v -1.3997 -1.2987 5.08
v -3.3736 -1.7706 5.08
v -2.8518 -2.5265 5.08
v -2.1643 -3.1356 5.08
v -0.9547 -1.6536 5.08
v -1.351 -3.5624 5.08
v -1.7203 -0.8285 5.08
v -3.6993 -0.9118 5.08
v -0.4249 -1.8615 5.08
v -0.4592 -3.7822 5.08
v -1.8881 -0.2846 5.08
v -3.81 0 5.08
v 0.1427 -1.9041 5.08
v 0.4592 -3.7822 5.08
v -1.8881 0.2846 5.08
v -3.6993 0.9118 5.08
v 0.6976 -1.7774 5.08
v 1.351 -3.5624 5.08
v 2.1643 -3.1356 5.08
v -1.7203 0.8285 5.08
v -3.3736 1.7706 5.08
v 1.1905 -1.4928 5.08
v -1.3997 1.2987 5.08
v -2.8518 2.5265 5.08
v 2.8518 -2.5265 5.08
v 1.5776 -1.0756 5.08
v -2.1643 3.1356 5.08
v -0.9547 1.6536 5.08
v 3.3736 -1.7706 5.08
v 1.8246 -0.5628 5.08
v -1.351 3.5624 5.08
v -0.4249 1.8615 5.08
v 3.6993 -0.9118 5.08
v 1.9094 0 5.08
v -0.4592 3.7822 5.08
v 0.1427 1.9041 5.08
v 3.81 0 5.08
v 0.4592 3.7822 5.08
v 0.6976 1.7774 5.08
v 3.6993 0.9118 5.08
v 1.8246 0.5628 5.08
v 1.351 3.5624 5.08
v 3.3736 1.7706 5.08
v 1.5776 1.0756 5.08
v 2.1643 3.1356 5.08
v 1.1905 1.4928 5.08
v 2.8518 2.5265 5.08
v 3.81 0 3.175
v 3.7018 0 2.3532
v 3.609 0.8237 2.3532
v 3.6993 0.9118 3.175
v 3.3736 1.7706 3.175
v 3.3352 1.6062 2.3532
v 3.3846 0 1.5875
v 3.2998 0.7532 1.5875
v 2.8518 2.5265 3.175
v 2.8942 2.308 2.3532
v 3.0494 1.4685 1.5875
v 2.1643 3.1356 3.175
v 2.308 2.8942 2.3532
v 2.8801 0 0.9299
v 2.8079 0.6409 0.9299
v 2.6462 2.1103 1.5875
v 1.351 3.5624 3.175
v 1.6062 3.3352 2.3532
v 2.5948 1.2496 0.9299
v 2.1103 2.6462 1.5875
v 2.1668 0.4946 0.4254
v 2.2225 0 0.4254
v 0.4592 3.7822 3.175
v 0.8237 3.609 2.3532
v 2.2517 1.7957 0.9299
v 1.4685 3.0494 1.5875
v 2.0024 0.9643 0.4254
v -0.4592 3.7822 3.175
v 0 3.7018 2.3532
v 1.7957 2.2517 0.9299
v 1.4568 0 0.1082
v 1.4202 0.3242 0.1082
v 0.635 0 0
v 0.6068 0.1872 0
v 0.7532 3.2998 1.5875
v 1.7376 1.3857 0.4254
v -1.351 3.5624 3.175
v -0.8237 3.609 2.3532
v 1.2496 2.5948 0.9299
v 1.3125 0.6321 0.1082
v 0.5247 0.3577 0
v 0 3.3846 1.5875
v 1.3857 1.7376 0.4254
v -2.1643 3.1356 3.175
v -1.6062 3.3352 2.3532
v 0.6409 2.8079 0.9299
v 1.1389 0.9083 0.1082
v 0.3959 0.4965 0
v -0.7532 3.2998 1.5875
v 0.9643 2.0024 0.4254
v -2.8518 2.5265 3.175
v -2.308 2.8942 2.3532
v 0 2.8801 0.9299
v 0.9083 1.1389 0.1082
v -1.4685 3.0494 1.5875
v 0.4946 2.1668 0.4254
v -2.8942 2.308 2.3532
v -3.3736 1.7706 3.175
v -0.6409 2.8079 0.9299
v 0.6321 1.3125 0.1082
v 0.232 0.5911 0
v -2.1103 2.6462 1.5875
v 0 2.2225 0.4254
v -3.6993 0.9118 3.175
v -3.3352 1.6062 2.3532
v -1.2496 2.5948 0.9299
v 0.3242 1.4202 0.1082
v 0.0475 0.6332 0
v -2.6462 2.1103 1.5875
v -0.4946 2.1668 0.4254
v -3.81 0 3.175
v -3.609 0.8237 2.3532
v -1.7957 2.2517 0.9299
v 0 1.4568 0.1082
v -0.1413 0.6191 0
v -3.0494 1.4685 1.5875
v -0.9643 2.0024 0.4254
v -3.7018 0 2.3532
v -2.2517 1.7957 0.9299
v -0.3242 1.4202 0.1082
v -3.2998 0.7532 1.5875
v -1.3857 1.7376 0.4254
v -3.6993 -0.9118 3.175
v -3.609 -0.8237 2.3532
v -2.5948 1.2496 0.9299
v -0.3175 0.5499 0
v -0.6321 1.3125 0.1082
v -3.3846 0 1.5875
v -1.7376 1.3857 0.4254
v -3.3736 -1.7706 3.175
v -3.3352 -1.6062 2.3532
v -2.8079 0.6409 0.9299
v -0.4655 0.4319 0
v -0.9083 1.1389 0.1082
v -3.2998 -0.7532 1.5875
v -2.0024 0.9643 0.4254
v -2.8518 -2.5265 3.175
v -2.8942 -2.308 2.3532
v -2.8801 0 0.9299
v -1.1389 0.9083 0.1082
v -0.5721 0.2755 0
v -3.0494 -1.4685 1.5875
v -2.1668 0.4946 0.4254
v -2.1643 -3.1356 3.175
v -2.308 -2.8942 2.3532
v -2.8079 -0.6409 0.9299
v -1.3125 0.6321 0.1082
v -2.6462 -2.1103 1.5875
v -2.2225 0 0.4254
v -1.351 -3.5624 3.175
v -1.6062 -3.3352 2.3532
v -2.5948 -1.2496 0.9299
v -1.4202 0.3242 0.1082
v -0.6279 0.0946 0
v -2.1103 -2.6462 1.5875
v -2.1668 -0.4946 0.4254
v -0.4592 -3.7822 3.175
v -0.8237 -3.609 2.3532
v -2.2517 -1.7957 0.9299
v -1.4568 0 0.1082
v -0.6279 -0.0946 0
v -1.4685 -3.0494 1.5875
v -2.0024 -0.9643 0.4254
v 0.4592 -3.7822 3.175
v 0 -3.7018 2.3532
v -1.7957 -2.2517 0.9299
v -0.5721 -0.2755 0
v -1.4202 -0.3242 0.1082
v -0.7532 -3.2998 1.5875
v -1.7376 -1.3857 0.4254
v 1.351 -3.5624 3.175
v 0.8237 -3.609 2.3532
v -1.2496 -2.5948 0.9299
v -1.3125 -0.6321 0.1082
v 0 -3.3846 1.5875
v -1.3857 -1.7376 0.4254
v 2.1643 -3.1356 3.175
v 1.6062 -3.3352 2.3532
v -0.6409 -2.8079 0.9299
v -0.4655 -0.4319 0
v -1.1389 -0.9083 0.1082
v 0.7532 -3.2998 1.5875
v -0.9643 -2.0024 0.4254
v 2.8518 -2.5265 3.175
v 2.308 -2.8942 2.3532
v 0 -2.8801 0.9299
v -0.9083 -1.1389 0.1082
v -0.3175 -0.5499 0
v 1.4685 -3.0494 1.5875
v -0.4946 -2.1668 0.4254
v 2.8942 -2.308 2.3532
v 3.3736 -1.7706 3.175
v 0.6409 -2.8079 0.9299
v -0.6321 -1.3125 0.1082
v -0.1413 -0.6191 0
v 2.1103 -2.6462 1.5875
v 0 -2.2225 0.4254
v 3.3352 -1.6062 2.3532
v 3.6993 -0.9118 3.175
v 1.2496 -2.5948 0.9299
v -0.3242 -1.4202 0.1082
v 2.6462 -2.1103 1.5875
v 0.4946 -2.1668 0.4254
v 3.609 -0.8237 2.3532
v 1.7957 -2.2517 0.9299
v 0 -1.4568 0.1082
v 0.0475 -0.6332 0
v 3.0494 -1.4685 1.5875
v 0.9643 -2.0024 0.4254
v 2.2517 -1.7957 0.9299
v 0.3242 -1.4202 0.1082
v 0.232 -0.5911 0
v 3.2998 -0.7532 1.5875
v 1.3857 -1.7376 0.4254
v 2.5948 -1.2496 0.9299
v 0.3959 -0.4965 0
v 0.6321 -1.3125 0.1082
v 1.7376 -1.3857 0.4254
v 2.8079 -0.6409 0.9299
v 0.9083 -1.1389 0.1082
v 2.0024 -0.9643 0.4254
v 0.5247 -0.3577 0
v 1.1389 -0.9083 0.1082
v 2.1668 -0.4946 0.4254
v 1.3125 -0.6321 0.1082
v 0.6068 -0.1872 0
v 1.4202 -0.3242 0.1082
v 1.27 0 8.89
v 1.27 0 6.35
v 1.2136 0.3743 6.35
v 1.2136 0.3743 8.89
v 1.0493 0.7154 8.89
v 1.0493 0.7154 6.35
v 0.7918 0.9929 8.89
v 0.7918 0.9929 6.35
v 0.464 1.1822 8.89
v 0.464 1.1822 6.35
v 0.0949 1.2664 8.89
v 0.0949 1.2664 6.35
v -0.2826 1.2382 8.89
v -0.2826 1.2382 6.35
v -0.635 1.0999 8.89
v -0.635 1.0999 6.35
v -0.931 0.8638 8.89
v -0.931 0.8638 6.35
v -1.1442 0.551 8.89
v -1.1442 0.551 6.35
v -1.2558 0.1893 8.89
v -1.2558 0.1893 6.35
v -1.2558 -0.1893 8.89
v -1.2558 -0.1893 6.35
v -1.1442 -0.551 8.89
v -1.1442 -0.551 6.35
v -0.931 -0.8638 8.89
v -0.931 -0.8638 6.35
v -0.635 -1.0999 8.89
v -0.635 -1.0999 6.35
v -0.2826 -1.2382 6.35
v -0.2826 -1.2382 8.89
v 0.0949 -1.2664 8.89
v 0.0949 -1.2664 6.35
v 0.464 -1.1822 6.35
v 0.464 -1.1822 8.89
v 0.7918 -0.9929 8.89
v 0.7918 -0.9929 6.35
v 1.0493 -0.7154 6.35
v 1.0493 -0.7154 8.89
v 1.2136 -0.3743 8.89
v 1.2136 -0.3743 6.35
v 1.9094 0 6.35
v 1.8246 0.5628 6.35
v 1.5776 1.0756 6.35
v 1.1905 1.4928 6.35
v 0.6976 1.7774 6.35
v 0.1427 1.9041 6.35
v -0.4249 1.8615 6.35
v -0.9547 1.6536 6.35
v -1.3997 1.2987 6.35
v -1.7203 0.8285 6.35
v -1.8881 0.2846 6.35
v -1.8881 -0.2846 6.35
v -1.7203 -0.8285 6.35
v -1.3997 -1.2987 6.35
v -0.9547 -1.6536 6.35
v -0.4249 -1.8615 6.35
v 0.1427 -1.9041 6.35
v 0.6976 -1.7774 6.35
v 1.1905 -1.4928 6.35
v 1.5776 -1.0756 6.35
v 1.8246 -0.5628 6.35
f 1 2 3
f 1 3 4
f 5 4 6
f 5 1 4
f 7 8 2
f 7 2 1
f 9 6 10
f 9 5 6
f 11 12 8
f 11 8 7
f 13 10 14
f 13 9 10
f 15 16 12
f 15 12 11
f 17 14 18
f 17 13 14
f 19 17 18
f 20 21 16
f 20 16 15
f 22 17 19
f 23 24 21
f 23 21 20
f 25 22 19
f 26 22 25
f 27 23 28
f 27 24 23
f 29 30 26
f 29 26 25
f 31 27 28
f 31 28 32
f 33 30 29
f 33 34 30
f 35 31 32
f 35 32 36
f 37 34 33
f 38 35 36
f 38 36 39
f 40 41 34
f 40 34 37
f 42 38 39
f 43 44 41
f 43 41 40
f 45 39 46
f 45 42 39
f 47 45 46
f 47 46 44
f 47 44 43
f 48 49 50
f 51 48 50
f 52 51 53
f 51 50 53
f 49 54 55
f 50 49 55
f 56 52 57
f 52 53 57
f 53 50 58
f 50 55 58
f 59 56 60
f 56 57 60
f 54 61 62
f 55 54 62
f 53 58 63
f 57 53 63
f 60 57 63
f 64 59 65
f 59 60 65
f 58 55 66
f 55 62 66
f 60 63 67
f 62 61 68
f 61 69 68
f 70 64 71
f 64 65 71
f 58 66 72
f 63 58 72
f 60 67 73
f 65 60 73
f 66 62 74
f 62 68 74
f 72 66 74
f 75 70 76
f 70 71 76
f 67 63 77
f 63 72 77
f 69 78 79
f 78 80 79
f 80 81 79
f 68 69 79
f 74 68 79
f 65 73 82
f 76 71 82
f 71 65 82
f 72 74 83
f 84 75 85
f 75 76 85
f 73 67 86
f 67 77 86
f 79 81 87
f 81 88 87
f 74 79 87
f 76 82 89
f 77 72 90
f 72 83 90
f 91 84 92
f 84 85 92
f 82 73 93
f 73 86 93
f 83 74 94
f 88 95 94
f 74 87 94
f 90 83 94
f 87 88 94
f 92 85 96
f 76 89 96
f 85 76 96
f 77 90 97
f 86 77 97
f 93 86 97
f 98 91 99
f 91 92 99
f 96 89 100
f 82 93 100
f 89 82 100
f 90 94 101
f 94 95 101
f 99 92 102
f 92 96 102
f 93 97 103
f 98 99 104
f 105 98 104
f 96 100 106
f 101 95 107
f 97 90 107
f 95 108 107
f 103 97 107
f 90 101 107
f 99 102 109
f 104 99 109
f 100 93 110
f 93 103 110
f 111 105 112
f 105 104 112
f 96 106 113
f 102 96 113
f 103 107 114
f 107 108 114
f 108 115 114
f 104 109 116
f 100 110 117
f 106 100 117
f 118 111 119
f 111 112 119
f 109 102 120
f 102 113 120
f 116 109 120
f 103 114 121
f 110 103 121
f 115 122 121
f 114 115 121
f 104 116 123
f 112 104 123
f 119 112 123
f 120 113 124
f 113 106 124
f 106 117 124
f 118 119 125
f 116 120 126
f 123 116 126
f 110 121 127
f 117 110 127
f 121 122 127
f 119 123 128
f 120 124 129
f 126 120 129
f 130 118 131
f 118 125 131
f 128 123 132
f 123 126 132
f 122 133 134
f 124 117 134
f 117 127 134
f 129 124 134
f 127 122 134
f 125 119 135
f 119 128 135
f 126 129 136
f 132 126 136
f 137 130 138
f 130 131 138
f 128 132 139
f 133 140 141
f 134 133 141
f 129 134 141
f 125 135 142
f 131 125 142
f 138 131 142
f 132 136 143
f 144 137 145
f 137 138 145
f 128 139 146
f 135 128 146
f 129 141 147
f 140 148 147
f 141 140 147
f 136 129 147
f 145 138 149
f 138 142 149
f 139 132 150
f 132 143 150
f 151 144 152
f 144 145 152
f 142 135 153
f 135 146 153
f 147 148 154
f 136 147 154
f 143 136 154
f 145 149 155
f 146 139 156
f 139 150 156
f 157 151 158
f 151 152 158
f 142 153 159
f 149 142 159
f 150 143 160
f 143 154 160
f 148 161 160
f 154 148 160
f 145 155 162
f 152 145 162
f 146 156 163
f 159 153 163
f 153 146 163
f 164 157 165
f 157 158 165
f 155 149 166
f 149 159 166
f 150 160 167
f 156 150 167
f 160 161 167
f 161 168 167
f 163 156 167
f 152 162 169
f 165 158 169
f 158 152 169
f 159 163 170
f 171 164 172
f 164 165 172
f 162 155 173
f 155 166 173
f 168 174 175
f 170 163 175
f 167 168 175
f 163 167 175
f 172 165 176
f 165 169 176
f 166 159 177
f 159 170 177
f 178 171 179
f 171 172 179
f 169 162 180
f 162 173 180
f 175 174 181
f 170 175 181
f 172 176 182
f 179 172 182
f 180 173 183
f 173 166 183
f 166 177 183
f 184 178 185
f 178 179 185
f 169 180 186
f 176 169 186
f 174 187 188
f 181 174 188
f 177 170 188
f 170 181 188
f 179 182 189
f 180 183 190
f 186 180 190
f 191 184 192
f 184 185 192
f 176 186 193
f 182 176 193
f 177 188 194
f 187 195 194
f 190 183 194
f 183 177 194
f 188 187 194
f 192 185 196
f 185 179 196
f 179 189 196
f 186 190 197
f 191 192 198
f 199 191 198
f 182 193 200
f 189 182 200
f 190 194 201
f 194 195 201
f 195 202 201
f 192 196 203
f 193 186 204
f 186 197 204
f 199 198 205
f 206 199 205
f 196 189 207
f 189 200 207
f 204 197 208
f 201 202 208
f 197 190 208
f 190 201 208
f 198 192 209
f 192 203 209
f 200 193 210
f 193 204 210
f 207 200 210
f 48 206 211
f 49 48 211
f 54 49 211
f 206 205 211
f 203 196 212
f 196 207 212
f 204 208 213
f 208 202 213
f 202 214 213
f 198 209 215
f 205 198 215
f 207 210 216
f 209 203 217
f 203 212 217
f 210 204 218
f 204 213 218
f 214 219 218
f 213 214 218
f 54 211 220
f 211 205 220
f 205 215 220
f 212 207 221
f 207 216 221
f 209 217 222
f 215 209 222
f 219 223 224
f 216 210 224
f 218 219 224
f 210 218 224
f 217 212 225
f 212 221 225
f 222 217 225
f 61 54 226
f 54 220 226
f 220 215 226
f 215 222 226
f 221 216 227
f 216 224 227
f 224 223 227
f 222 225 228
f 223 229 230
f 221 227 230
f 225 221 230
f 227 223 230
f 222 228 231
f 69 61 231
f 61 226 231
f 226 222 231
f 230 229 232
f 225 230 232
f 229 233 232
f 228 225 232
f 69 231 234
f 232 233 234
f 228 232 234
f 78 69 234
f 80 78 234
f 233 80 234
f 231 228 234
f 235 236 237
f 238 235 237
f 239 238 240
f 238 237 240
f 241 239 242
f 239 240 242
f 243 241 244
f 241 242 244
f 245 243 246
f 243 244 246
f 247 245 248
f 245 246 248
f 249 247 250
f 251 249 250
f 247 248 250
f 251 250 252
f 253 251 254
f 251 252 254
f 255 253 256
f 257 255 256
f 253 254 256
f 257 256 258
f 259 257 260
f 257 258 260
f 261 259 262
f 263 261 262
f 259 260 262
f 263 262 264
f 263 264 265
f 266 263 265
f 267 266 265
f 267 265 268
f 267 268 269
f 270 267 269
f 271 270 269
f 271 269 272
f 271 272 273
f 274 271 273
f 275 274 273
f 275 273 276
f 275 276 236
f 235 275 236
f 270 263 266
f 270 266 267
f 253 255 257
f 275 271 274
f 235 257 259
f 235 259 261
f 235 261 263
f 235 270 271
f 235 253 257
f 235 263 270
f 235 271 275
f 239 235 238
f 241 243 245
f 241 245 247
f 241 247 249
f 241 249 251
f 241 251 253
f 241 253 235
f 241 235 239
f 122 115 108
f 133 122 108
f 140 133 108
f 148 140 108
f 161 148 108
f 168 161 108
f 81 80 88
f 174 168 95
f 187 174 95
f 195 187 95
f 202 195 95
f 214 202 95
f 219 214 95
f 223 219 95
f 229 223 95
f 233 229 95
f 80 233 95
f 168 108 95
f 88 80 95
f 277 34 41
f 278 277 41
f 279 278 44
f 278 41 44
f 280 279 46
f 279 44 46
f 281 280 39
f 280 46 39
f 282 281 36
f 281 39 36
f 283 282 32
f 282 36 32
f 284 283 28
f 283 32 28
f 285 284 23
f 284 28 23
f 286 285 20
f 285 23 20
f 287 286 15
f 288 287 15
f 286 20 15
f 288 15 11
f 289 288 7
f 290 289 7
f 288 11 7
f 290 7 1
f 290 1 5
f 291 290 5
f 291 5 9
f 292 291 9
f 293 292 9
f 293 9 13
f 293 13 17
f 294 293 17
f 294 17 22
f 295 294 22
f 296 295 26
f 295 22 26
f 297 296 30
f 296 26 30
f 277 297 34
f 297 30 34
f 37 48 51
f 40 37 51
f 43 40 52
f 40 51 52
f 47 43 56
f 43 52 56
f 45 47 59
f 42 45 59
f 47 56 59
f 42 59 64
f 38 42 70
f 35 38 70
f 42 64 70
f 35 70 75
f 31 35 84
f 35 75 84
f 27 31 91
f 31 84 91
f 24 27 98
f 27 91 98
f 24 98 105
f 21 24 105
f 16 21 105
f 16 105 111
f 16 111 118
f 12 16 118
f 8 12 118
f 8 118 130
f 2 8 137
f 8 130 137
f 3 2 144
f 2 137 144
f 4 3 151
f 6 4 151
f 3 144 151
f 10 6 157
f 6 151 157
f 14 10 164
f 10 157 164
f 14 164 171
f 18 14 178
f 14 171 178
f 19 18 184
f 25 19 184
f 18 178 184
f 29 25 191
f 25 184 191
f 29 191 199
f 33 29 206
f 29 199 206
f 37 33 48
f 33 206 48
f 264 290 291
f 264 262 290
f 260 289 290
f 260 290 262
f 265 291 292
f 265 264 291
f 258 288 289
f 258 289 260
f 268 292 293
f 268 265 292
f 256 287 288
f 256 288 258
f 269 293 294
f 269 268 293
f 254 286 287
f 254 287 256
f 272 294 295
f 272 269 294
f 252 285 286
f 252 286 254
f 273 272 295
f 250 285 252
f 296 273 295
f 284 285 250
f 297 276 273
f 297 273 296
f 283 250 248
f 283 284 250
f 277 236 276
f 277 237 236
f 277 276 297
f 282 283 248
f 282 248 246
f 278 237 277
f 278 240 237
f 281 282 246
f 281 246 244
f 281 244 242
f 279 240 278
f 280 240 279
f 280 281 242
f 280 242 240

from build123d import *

# Parameters (mm, degrees)
F0_R     = 3.81
F1_DEPTH = 5.08
F2_R     = 3.175
F3_R     = 1.27
F4_DEPTH = 3.81
F5_R     = 1.909408
F6_DEPTH = 1.27


with BuildPart() as f1:
    # F0 (on Top) → F1 (new body)
    with BuildSketch(Plane.XY):
        Circle(F0_R)
    extrude(amount=F1_DEPTH)

    # F2
    f2_edges = [f1.edges().sort_by_distance(p)[0] for p in [
        (-3.81, 0, 0),
    ]]
    fillet(f2_edges, radius=F2_R)

    # F3 (on face) → F4 (join)
    with BuildSketch(Plane.XY.offset(5.08)):
        Circle(F3_R)
    extrude(amount=F4_DEPTH)

    # F5 (on face) → F6 (join)
    with BuildSketch(Plane.XY.offset(5.08)):
        Circle(F5_R)
    extrude(amount=F6_DEPTH)


solid = f1.part
